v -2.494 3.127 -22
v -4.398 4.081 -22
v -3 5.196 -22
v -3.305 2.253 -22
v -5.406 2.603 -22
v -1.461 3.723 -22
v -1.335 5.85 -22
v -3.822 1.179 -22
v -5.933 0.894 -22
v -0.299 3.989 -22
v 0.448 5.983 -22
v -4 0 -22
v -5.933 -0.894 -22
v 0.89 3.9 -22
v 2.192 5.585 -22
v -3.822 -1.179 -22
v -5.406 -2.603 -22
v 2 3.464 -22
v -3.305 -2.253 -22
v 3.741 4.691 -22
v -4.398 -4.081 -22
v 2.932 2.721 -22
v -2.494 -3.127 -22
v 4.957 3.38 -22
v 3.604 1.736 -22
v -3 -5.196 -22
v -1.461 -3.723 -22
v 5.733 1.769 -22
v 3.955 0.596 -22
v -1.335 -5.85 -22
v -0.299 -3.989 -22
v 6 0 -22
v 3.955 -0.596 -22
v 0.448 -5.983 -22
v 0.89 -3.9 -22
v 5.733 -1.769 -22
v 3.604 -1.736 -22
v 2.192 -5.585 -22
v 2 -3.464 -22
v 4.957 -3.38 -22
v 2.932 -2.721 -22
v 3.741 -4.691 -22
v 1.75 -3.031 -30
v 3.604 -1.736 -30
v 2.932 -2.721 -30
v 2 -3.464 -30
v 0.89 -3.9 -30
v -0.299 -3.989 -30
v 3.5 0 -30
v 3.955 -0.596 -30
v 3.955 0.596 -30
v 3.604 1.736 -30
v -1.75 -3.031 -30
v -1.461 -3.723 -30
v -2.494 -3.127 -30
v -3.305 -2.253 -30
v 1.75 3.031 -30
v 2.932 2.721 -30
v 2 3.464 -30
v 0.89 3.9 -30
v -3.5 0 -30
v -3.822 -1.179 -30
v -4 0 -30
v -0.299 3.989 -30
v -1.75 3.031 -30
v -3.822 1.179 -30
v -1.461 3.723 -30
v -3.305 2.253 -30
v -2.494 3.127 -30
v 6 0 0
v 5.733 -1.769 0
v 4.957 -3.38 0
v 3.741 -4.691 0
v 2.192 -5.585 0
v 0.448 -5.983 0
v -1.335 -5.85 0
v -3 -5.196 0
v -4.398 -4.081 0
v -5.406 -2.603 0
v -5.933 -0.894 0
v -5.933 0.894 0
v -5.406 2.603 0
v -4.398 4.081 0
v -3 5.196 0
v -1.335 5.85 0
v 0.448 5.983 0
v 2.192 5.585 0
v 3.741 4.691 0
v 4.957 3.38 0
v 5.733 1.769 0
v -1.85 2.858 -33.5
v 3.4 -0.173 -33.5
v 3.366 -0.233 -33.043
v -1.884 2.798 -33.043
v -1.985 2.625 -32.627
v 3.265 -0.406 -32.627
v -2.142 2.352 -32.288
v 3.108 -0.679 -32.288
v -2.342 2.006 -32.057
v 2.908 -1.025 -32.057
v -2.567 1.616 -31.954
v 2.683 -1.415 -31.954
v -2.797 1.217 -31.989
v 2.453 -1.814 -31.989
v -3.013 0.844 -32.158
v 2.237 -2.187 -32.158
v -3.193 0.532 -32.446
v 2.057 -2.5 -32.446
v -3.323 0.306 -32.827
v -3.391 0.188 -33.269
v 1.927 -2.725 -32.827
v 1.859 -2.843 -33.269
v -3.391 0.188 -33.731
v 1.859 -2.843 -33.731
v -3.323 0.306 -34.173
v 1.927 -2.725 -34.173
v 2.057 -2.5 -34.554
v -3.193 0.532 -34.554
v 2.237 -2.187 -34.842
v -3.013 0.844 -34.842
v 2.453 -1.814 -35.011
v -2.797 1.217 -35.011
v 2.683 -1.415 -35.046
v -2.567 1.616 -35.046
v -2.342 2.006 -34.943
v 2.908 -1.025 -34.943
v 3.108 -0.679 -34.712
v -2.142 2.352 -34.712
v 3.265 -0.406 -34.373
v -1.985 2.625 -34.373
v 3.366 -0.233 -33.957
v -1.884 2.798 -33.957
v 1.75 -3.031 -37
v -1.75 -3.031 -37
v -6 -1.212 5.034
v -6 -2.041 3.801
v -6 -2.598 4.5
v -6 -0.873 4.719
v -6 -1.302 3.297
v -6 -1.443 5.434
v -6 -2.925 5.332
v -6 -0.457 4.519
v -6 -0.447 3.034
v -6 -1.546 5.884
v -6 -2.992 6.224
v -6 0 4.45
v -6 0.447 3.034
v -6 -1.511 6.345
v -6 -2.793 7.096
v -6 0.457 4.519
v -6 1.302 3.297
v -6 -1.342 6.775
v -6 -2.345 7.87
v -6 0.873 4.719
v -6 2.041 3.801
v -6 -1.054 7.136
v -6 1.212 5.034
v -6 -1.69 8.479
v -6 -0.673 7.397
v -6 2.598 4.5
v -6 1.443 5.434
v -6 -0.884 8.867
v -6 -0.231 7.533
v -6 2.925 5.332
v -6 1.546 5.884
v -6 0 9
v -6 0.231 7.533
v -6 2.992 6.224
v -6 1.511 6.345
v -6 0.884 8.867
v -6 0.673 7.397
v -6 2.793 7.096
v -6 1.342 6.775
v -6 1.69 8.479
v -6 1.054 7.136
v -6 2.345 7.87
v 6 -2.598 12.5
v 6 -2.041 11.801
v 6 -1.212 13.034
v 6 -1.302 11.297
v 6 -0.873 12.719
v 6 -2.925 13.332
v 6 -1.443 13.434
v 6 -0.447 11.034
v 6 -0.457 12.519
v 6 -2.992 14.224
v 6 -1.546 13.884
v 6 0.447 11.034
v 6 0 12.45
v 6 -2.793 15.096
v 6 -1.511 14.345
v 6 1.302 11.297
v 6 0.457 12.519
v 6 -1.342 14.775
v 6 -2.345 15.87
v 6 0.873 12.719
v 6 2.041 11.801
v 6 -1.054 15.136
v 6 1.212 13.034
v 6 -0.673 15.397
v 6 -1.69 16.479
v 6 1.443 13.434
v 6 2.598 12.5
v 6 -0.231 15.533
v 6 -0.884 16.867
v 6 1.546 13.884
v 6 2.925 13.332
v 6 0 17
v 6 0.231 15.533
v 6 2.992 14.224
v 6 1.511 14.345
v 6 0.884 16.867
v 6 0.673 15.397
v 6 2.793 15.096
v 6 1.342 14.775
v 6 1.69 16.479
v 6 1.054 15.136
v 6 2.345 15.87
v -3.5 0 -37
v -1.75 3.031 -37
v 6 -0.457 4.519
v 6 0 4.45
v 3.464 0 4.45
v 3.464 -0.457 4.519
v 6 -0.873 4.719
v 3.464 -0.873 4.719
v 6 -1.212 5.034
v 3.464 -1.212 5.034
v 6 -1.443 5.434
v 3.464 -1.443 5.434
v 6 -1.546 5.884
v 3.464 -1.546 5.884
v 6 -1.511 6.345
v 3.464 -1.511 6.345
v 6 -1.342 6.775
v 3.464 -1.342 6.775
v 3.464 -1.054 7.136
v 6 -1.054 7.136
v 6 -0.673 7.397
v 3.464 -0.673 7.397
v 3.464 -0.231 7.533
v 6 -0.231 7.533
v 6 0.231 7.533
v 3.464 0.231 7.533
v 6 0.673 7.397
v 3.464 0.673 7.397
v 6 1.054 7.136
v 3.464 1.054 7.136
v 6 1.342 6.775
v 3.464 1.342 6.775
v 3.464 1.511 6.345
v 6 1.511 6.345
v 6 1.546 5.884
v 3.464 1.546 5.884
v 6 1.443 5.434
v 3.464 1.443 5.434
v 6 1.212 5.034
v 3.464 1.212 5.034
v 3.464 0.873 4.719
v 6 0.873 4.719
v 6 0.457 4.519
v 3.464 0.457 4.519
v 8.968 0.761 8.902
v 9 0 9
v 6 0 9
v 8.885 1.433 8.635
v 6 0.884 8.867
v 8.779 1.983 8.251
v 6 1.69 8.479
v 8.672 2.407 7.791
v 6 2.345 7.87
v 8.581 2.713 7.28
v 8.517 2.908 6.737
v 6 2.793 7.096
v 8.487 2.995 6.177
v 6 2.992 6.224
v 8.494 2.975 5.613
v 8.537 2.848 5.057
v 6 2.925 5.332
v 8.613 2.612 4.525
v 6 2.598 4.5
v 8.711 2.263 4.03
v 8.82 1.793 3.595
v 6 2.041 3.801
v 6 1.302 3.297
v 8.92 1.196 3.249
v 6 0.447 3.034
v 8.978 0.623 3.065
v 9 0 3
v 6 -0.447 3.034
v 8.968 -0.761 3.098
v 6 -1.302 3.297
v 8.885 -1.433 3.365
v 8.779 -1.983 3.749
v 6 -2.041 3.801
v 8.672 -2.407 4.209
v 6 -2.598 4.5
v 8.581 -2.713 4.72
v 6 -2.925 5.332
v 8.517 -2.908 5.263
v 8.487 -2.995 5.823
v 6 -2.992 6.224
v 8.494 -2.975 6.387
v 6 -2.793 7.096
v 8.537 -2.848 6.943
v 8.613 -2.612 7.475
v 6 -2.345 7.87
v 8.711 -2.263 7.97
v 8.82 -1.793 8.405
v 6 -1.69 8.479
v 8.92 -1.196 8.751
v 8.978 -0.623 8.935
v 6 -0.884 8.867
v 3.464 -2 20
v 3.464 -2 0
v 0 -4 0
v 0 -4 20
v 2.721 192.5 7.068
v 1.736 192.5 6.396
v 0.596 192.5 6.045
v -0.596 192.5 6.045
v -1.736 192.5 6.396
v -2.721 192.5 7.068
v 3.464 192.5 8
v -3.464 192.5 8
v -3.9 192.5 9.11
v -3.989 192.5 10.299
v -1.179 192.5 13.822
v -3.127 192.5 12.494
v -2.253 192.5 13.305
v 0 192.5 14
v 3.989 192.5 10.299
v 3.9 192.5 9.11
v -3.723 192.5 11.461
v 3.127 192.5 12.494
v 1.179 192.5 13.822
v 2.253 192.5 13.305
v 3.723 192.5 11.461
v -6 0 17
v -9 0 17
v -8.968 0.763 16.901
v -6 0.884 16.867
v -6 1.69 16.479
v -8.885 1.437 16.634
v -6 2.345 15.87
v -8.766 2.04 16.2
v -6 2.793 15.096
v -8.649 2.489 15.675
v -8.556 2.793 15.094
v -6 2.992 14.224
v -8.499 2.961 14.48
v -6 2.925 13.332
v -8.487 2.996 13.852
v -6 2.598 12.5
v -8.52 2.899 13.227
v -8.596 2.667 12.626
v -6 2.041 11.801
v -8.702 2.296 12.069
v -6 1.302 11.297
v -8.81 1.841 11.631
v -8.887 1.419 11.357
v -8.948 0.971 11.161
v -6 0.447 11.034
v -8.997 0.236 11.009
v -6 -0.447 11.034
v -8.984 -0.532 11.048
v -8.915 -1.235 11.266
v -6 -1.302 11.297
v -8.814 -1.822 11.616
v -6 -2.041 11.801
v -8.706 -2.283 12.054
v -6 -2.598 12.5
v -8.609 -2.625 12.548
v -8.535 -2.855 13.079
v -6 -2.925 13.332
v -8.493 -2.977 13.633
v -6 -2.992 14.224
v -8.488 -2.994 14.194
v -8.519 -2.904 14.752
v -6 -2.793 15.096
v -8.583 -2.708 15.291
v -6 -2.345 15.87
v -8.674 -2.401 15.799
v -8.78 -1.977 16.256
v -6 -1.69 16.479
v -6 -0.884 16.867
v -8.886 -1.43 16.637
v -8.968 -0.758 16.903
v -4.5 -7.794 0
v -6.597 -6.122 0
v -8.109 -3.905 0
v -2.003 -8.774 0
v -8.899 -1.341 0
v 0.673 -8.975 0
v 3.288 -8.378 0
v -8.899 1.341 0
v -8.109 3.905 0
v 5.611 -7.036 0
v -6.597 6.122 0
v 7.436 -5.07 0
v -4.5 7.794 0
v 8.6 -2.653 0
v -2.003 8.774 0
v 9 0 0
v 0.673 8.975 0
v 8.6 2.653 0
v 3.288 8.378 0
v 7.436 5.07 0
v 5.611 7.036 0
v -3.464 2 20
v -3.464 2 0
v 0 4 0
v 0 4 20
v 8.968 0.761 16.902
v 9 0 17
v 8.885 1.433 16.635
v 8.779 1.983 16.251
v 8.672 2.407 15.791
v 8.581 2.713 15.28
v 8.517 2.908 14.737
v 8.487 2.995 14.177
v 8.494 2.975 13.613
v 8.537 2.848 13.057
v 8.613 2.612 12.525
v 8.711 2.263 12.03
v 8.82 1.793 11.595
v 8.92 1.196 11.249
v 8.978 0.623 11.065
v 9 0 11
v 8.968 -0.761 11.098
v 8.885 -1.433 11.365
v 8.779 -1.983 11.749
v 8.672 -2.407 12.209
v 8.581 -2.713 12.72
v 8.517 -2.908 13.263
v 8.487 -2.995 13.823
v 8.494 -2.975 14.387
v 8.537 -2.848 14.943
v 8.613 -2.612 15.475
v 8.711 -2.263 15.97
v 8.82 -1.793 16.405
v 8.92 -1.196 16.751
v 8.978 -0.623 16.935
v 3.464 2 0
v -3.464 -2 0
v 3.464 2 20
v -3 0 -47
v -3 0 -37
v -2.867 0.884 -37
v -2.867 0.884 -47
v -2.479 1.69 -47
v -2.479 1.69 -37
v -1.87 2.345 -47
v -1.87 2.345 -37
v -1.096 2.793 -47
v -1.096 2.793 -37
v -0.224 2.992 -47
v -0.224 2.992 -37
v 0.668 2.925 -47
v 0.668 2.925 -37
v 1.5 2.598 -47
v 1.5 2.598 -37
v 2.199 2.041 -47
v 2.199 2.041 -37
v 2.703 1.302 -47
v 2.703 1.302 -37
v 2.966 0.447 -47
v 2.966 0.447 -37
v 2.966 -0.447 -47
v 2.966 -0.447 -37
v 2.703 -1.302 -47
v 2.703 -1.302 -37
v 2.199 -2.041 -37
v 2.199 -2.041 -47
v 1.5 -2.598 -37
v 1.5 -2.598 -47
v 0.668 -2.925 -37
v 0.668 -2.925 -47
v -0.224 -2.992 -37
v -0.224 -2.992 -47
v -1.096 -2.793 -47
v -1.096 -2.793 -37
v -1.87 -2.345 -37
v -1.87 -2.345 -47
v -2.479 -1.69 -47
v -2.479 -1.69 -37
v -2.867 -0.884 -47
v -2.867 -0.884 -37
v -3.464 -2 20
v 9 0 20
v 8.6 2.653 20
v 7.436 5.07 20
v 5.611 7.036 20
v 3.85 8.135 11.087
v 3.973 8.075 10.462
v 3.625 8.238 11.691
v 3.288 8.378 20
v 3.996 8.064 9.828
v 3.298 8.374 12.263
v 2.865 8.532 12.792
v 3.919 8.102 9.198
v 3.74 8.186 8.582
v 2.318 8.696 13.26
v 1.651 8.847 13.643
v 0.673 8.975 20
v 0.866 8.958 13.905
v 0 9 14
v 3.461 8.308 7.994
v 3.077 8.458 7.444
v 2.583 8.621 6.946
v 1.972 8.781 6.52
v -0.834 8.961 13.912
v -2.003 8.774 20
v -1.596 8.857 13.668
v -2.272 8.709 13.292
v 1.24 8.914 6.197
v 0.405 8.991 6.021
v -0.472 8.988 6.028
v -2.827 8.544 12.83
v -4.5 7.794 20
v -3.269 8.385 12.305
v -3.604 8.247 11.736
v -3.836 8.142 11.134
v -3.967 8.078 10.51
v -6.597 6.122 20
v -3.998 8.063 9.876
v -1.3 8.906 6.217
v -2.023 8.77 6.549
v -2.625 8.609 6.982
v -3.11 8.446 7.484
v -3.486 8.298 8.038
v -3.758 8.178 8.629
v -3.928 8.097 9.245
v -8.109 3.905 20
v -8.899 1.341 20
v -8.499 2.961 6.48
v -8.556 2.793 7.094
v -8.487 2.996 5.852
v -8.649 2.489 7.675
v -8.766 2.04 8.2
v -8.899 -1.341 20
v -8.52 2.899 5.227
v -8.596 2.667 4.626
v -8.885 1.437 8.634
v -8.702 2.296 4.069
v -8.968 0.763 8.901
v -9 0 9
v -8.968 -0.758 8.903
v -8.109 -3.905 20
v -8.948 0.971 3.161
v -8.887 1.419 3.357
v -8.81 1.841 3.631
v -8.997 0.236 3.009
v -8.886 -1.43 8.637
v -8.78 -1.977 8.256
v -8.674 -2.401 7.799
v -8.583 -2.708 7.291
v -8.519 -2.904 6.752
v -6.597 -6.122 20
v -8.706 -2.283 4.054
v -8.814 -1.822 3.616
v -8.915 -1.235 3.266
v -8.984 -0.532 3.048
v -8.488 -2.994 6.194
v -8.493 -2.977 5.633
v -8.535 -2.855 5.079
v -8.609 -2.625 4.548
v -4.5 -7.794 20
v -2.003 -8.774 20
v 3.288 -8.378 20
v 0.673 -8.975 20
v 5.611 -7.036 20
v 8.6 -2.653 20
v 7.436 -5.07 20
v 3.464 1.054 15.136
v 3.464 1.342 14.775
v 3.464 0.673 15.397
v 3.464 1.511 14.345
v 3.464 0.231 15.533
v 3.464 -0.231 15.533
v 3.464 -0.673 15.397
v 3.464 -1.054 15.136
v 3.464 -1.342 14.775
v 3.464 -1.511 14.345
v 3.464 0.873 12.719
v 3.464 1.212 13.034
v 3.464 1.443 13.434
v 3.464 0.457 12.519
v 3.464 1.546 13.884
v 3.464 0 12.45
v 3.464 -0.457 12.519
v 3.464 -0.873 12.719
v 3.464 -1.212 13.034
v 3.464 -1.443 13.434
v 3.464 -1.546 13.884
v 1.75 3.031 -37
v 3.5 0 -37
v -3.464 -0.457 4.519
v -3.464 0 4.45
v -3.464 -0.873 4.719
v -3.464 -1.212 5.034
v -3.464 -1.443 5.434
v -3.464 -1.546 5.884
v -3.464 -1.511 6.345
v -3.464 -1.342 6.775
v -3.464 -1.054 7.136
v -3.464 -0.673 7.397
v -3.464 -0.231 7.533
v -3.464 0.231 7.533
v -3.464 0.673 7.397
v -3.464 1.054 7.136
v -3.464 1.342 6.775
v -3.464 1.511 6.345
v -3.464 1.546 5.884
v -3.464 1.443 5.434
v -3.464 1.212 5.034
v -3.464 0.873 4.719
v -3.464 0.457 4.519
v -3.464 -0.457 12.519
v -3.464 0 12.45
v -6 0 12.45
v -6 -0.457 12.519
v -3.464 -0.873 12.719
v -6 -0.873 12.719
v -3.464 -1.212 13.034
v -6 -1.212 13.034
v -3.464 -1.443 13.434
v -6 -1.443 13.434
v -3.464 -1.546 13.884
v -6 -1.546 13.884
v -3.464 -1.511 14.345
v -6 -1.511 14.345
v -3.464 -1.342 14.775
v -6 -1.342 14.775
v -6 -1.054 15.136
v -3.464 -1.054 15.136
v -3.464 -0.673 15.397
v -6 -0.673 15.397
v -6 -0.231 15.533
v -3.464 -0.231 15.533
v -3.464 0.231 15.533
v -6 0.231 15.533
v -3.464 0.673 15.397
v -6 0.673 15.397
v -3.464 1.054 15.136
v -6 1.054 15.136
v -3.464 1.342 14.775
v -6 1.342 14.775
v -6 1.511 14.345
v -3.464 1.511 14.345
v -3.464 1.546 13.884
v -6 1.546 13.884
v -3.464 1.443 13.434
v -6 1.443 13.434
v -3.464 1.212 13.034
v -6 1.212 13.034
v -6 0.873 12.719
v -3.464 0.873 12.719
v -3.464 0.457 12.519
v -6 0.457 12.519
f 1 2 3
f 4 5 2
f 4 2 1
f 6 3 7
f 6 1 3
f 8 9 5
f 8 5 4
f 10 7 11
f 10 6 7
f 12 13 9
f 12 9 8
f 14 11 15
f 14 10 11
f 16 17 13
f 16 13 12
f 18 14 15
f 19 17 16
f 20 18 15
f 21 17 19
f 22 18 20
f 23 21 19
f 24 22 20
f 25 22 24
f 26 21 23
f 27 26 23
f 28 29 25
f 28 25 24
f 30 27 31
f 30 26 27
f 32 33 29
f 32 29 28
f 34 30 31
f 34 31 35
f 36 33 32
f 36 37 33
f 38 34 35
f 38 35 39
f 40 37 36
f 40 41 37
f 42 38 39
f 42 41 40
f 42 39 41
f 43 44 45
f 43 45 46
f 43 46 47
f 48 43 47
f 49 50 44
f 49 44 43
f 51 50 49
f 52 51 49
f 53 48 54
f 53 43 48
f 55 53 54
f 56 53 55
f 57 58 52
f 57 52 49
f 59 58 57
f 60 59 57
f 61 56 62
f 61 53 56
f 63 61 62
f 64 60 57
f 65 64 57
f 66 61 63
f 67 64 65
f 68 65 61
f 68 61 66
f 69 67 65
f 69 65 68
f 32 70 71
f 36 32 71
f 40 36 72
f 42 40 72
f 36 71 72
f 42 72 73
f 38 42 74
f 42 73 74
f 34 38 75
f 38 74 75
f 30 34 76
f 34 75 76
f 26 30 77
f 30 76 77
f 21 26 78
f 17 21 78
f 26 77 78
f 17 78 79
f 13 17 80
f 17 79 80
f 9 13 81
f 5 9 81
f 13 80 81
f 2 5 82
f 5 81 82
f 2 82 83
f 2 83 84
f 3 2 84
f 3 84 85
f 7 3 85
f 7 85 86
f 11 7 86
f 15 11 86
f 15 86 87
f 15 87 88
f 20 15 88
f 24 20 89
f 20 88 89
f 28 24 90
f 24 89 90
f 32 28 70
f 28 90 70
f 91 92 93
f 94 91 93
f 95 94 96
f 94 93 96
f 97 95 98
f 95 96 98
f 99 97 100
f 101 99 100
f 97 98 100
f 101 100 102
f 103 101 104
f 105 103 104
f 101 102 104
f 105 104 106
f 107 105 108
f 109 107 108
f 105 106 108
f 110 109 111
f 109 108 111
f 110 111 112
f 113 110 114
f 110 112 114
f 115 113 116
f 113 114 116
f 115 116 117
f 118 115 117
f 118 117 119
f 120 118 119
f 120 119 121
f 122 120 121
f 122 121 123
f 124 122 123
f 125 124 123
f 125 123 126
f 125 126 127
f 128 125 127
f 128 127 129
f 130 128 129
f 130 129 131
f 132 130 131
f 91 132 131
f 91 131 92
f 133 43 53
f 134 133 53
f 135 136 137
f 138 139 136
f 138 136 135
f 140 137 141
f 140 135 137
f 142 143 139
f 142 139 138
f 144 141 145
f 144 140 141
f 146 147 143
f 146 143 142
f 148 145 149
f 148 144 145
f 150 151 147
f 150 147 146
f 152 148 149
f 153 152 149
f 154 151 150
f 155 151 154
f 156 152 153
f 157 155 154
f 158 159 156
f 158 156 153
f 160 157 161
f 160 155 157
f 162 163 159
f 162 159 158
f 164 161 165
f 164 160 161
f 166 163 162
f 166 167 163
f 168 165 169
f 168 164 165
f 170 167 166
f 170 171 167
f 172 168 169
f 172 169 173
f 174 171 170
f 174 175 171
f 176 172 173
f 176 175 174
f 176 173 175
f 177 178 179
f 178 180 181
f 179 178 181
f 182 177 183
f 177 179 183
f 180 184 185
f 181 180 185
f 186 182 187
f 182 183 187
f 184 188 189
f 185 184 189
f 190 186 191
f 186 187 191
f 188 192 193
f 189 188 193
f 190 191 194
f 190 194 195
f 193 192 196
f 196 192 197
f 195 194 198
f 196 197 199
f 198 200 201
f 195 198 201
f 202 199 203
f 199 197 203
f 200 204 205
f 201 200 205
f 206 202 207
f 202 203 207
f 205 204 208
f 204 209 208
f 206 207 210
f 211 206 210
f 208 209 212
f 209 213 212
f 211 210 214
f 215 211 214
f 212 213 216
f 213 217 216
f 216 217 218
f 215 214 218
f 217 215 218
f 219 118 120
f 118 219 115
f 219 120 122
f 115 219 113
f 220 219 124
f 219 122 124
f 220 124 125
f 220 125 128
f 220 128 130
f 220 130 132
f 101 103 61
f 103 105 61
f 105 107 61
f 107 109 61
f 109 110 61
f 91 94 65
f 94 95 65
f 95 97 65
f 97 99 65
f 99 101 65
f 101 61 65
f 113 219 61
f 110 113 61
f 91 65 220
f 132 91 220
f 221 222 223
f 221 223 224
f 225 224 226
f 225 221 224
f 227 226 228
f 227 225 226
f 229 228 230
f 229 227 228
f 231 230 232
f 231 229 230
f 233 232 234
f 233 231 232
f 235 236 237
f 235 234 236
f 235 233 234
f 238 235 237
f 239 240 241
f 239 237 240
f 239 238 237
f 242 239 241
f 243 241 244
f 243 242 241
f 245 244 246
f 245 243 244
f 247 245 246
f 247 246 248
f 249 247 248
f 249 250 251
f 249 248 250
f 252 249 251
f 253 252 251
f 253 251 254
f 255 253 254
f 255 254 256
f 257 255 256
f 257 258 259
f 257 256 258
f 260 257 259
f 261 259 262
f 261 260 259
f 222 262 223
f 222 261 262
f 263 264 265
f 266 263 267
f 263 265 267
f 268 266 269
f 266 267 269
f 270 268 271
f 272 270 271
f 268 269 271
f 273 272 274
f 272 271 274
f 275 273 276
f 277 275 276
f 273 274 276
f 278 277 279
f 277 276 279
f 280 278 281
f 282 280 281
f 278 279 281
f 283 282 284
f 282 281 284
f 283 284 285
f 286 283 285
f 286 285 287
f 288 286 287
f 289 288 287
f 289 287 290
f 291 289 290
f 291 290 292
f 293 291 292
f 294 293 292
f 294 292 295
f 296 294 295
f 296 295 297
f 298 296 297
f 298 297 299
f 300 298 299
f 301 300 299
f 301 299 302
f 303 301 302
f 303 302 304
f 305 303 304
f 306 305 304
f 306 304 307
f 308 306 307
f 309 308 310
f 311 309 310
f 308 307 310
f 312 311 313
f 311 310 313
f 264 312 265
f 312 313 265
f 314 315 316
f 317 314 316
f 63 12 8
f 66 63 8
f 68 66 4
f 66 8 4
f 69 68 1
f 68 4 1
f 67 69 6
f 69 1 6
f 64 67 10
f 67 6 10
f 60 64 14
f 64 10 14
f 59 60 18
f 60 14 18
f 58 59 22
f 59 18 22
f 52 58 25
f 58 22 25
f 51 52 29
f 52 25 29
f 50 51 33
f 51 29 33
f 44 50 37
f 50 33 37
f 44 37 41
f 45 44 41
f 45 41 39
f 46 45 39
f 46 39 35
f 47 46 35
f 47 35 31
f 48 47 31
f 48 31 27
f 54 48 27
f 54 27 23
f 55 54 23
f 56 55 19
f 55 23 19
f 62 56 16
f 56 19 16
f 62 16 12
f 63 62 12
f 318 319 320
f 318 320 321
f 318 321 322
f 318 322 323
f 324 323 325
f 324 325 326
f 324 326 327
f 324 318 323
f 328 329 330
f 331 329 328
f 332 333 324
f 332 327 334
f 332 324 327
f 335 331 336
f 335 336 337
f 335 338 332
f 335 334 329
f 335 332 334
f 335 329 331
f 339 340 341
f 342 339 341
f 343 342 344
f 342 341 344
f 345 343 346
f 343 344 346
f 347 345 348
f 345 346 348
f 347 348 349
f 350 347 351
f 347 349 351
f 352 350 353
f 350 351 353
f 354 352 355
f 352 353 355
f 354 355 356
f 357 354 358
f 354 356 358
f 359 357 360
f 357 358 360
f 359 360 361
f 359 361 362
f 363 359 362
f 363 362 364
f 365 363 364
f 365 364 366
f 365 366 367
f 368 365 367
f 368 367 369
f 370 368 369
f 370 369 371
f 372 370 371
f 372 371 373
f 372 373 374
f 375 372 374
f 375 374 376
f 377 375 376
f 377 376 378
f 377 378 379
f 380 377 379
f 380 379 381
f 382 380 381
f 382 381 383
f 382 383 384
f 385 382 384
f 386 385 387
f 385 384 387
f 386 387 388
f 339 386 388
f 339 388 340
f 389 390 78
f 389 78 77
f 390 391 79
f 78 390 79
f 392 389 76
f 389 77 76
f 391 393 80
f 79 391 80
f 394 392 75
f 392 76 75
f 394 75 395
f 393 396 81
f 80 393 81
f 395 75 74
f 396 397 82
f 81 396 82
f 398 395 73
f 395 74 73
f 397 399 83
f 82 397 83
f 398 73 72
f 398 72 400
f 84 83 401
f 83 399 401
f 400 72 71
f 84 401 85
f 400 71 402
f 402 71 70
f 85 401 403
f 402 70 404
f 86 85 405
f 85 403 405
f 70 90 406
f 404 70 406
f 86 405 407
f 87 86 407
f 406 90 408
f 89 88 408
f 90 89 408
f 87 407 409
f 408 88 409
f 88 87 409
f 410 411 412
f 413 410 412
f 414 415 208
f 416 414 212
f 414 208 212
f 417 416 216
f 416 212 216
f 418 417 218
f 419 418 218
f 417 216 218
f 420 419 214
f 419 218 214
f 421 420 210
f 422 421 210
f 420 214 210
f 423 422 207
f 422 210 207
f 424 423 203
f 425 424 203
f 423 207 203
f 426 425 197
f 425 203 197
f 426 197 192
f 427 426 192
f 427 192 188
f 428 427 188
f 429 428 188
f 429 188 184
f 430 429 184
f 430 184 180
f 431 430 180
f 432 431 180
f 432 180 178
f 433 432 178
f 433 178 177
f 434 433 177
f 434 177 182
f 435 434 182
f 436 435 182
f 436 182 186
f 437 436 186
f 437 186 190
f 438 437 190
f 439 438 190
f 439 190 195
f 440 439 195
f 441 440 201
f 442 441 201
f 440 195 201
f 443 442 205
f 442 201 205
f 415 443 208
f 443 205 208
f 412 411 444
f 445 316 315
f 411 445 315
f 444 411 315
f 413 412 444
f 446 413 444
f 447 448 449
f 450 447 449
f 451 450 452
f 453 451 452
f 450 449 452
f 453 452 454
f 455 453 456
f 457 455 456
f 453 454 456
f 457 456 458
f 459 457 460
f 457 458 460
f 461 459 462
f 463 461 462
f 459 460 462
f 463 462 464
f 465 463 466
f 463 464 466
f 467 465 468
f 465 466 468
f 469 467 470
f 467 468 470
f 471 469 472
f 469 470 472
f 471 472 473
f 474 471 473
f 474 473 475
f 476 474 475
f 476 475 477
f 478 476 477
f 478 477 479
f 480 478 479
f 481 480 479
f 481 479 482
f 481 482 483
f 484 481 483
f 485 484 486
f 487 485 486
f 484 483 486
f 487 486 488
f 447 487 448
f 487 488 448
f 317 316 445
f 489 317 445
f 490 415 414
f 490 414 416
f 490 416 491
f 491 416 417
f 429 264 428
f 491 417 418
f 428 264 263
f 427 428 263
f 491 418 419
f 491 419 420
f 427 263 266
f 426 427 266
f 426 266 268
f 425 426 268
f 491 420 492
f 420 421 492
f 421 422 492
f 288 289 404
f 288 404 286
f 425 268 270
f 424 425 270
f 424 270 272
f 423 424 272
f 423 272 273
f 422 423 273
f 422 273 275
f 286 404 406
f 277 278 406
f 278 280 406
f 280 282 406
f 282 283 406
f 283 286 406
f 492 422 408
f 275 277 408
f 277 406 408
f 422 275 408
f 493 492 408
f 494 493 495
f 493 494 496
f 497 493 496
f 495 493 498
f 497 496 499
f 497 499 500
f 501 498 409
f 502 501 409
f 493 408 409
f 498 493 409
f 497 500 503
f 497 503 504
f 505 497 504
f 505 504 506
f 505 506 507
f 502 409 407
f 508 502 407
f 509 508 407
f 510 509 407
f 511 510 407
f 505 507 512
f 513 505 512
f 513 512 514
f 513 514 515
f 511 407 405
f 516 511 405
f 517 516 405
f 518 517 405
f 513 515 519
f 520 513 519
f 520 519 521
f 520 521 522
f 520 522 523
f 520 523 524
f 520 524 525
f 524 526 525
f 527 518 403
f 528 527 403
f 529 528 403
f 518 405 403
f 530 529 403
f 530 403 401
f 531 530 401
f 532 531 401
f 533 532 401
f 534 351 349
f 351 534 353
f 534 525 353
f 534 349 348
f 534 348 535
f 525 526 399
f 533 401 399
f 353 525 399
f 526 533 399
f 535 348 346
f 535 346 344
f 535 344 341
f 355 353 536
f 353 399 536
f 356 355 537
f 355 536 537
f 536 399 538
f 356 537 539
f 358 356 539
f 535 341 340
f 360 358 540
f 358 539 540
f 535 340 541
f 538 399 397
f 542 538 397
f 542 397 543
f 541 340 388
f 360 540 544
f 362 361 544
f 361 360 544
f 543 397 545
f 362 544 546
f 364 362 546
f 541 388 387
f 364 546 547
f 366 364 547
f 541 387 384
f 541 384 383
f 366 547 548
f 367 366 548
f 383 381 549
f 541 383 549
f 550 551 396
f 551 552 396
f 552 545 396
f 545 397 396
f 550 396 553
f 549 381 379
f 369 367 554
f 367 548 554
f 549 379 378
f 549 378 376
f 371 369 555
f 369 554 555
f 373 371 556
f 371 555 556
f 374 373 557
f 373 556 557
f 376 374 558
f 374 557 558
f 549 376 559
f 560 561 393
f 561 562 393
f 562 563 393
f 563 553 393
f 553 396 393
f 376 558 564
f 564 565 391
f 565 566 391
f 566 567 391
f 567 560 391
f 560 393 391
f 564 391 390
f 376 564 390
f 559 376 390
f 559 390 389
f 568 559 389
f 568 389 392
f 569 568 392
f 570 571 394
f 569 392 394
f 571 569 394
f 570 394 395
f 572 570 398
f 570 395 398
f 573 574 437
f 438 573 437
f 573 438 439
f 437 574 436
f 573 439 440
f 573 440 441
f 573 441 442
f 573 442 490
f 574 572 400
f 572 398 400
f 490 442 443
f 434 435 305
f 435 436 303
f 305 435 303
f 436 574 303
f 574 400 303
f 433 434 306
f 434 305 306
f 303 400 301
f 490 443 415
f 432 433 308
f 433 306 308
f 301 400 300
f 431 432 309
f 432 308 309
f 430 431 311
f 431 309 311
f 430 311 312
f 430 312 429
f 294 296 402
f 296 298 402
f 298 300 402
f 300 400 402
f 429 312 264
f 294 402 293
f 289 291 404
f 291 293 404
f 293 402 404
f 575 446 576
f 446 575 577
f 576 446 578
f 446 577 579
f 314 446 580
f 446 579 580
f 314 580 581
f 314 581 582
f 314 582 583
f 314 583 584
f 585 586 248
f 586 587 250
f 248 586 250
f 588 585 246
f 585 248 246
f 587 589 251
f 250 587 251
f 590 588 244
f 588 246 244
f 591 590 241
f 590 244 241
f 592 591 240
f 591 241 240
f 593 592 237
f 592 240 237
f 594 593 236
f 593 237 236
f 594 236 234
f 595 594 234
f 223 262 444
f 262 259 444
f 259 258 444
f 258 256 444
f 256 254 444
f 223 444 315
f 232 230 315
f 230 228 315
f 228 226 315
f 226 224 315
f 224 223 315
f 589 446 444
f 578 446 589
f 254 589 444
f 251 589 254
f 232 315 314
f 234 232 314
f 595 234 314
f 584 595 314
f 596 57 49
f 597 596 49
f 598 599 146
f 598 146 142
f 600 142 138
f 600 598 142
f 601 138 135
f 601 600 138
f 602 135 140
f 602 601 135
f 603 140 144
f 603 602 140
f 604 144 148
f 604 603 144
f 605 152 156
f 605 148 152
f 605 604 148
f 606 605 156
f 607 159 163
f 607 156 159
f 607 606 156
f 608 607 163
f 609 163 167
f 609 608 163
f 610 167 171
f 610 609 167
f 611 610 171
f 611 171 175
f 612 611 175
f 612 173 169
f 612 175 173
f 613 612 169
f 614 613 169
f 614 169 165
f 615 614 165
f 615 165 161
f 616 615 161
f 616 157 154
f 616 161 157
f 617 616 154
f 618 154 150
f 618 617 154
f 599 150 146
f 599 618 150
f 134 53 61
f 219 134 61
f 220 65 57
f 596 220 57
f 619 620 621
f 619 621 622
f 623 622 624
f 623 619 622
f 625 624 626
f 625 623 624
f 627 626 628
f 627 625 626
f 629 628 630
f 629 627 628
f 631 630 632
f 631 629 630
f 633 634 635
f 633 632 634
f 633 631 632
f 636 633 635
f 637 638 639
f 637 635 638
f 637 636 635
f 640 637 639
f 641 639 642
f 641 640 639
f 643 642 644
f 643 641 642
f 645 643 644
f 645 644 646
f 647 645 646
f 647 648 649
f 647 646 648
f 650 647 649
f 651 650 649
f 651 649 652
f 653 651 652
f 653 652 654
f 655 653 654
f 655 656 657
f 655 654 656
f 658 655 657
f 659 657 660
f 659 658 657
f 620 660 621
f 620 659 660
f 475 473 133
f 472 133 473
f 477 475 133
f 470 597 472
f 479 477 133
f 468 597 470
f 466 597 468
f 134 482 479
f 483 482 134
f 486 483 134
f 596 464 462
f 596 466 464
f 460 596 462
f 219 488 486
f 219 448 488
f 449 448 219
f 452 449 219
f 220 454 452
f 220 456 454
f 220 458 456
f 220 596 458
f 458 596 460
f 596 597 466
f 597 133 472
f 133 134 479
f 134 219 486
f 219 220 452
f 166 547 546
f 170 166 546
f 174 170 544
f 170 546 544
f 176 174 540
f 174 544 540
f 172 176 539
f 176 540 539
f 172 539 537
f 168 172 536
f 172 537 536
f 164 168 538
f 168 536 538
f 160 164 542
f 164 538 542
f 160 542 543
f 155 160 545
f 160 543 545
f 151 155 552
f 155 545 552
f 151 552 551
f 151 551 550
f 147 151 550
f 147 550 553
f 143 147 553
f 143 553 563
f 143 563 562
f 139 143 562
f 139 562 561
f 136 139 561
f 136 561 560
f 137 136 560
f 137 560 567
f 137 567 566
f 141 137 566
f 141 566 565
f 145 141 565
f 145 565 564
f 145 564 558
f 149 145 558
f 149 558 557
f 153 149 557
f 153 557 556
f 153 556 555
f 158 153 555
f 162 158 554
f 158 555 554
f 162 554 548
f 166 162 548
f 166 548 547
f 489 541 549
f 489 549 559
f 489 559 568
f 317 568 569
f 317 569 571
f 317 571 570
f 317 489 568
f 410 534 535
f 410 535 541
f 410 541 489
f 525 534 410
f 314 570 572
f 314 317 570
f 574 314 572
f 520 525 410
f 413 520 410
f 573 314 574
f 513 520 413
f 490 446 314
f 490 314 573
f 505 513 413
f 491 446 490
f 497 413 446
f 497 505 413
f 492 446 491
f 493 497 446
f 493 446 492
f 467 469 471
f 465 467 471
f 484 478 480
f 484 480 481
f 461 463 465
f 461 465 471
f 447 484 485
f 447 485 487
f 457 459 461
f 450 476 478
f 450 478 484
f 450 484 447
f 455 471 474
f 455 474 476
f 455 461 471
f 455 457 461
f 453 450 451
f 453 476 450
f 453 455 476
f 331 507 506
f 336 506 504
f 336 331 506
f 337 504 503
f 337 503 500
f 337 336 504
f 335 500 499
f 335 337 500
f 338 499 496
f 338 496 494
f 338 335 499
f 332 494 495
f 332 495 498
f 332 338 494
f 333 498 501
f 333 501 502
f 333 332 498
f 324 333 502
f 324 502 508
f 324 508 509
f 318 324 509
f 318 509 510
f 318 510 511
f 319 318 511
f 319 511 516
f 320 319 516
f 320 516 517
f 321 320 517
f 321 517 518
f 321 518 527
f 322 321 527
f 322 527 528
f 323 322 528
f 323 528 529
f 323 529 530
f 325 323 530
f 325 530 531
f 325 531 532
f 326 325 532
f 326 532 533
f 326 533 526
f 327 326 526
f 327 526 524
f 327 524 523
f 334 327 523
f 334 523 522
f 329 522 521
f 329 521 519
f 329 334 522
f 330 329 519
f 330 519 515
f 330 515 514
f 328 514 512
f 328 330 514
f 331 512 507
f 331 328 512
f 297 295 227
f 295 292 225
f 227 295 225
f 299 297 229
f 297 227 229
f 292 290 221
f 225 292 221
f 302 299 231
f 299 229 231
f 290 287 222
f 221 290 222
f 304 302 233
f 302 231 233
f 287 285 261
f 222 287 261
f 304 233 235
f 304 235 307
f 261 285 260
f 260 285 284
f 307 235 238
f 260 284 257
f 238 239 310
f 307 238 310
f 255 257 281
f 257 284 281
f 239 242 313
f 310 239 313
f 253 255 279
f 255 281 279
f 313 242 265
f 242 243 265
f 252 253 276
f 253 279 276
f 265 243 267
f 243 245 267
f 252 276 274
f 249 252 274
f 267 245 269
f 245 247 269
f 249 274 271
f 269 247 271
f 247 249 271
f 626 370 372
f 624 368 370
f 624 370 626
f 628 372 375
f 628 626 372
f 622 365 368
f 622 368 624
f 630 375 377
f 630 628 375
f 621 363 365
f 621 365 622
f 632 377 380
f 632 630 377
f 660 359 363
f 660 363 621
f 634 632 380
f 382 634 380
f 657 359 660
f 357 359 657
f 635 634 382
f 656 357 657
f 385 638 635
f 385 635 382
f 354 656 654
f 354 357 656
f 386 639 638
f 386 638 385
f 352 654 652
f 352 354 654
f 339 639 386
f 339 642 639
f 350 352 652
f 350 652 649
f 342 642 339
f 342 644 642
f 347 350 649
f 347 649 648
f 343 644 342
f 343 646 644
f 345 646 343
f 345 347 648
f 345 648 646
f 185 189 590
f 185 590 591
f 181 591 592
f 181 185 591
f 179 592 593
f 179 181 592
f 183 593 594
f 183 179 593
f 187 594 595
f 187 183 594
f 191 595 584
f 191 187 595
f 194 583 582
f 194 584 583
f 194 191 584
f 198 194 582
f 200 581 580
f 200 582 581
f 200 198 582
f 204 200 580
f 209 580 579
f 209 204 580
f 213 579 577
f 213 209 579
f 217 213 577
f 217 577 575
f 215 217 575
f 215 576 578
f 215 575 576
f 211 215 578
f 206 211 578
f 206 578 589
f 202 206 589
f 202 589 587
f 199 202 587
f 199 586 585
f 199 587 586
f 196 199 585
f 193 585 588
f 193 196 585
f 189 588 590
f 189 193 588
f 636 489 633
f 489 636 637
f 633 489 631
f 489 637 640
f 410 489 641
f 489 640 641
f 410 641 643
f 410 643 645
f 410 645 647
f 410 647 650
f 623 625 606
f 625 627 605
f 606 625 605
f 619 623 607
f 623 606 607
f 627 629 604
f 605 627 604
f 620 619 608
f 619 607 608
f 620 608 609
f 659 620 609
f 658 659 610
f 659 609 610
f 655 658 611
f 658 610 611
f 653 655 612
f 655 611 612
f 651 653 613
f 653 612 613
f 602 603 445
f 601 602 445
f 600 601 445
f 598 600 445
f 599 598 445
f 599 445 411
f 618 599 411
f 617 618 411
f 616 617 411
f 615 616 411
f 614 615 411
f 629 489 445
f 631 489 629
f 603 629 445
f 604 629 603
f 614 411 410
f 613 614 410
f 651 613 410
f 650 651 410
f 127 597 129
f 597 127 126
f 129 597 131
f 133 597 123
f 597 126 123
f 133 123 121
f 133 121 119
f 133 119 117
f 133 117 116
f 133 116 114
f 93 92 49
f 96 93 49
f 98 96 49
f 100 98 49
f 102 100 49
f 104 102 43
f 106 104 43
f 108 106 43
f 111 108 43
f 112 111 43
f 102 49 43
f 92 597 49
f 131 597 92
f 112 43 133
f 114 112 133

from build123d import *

# Parameters (mm, degrees)
SKETCH1_R                = 9
BOSS_EXTRUDE1_DEPTH      = 20
BOSS_EXTRUDE3_REACH      = 204.69
BOSS_EXTRUDE3_END_RADIUS = 9
SKETCH6_R                = 4
CUT_EXTRUDE1_DEPTH       = 9
CUT_EXTRUDE1_DEPTH_BACK  = 9
SKETCH8_R                = 1.55
SKETCH11_R               = 6
BOSS_EXTRUDE12_DEPTH     = 22
SKETCH12_R               = 4
BOSS_EXTRUDE13_DEPTH     = 8
BOSS_EXTRUDE14_DEPTH     = 7
SKETCH14_R               = 1.55
CUT_EXTRUDE2_DEPTH       = 6.1
SKETCH15_R               = 3
BOSS_EXTRUDE15_DEPTH     = 10
CUT_EXTRUDE5_START       = 9
SKETCH16_R               = 3
CUT_EXTRUDE5_DEPTH       = 3
CUT_EXTRUDE6_START       = -6
SKETCH16_2_R             = 3
CUT_EXTRUDE6_DEPTH       = 3


with BuildPart() as part:
    # Sketch1 → Boss-Extrude1 (new body)
    with BuildSketch(Plane.XY):
        Circle(SKETCH1_R)
        Polygon((0, 4), (3.464101615, 2), (3.464101615, -2), (0, -4), (-3.464101615, -2), (-3.464101615, 2), align=None, mode=Mode.SUBTRACT)
    extrude(amount=BOSS_EXTRUDE1_DEPTH)

    # Boss-Extrude3: up to this cylinder (the profile starts outside it)
    boss_extrude3_end = Plane(origin=(0, 0, 10), z_dir=(0, 0, -1)) * Cylinder(BOSS_EXTRUDE3_END_RADIUS, 428.38, mode=Mode.PRIVATE)
    # Sketch6 → Boss-Extrude3 (add, up to the surface)
    with BuildSketch(Plane(origin=(0, 192.5, 0), x_dir=(1, 0, 0), z_dir=(0, 1, 0)), mode=Mode.PRIVATE) as boss_extrude3_sk1:
        with Locations((0, -10)):
            Circle(SKETCH6_R)
    boss_extrude3_tool1 = extrude(boss_extrude3_sk1.sketch, amount=-BOSS_EXTRUDE3_REACH, mode=Mode.PRIVATE) - boss_extrude3_end
    add(boss_extrude3_tool1.solids().sort_by_distance((0, 192.5, 10))[0])

    # Sketch8 → Cut-Extrude1 (cut, two sides: drawn at the far end of the back side and taken through both)
    with BuildSketch(Plane.ZY.offset(-CUT_EXTRUDE1_DEPTH_BACK)):
        with Locations((6, 0)):
            Circle(SKETCH8_R)
        with Locations((14, 0)):
            Circle(SKETCH8_R)
    extrude(amount=CUT_EXTRUDE1_DEPTH + CUT_EXTRUDE1_DEPTH_BACK, mode=Mode.SUBTRACT)

    # Sketch11 → Boss-Extrude12 (add)
    with BuildSketch(Plane(origin=(0, 0, 0), x_dir=(-1, 0, 0), z_dir=(0, 0, -1))):
        Circle(SKETCH11_R)
    extrude(amount=BOSS_EXTRUDE12_DEPTH)

    # Sketch12 → Boss-Extrude13 (add)
    with BuildSketch(Plane(origin=(0, 0, -22), x_dir=(-1, 0, 0), z_dir=(0, 0, -1))):
        Circle(SKETCH12_R)
    extrude(amount=BOSS_EXTRUDE13_DEPTH)

    # Sketch13 → Boss-Extrude14 (add)
    with BuildSketch(Plane(origin=(0, 0, -30), x_dir=(-1, 0, 0), z_dir=(0, 0, -1))):
        Polygon((1.75, 3.031088913), (-1.75, 3.031088913), (-3.5, 0), (-1.75, -3.031088913), (1.75, -3.031088913), (3.5, 0), align=None)
    extrude(amount=BOSS_EXTRUDE14_DEPTH)

    # Sketch14 → Cut-Extrude2 (cut)
    with BuildSketch(Plane(origin=(2.625, -1.515544457, 0), x_dir=(0, 0, -1), z_dir=(0.8660254037844379, -0.5000000000000011, 0))):
        with Locations((33.5, 0)):
            Circle(SKETCH14_R)
    extrude(amount=-CUT_EXTRUDE2_DEPTH, mode=Mode.SUBTRACT)

    # Sketch15 → Boss-Extrude15 (add)
    with BuildSketch(Plane(origin=(0, 0, -37), x_dir=(-1, 0, 0), z_dir=(0, 0, -1))):
        Circle(SKETCH15_R)
    extrude(amount=BOSS_EXTRUDE15_DEPTH)

    # Sketch16 → Cut-Extrude5 (cut)
    with BuildSketch(Plane.ZY.offset(CUT_EXTRUDE5_START)):
        with Locations((6, 0)):
            Circle(SKETCH16_R)
        with Locations((14, 0)):
            Circle(SKETCH16_R)
    extrude(amount=-CUT_EXTRUDE5_DEPTH, mode=Mode.SUBTRACT)

    # Sketch16<2> → Cut-Extrude6 (cut)
    with BuildSketch(Plane.ZY.offset(CUT_EXTRUDE6_START)):
        with Locations((6, 0)):
            Circle(SKETCH16_2_R)
        with Locations((14, 0)):
            Circle(SKETCH16_2_R)
    extrude(amount=-CUT_EXTRUDE6_DEPTH, mode=Mode.SUBTRACT)


solid = part.part
